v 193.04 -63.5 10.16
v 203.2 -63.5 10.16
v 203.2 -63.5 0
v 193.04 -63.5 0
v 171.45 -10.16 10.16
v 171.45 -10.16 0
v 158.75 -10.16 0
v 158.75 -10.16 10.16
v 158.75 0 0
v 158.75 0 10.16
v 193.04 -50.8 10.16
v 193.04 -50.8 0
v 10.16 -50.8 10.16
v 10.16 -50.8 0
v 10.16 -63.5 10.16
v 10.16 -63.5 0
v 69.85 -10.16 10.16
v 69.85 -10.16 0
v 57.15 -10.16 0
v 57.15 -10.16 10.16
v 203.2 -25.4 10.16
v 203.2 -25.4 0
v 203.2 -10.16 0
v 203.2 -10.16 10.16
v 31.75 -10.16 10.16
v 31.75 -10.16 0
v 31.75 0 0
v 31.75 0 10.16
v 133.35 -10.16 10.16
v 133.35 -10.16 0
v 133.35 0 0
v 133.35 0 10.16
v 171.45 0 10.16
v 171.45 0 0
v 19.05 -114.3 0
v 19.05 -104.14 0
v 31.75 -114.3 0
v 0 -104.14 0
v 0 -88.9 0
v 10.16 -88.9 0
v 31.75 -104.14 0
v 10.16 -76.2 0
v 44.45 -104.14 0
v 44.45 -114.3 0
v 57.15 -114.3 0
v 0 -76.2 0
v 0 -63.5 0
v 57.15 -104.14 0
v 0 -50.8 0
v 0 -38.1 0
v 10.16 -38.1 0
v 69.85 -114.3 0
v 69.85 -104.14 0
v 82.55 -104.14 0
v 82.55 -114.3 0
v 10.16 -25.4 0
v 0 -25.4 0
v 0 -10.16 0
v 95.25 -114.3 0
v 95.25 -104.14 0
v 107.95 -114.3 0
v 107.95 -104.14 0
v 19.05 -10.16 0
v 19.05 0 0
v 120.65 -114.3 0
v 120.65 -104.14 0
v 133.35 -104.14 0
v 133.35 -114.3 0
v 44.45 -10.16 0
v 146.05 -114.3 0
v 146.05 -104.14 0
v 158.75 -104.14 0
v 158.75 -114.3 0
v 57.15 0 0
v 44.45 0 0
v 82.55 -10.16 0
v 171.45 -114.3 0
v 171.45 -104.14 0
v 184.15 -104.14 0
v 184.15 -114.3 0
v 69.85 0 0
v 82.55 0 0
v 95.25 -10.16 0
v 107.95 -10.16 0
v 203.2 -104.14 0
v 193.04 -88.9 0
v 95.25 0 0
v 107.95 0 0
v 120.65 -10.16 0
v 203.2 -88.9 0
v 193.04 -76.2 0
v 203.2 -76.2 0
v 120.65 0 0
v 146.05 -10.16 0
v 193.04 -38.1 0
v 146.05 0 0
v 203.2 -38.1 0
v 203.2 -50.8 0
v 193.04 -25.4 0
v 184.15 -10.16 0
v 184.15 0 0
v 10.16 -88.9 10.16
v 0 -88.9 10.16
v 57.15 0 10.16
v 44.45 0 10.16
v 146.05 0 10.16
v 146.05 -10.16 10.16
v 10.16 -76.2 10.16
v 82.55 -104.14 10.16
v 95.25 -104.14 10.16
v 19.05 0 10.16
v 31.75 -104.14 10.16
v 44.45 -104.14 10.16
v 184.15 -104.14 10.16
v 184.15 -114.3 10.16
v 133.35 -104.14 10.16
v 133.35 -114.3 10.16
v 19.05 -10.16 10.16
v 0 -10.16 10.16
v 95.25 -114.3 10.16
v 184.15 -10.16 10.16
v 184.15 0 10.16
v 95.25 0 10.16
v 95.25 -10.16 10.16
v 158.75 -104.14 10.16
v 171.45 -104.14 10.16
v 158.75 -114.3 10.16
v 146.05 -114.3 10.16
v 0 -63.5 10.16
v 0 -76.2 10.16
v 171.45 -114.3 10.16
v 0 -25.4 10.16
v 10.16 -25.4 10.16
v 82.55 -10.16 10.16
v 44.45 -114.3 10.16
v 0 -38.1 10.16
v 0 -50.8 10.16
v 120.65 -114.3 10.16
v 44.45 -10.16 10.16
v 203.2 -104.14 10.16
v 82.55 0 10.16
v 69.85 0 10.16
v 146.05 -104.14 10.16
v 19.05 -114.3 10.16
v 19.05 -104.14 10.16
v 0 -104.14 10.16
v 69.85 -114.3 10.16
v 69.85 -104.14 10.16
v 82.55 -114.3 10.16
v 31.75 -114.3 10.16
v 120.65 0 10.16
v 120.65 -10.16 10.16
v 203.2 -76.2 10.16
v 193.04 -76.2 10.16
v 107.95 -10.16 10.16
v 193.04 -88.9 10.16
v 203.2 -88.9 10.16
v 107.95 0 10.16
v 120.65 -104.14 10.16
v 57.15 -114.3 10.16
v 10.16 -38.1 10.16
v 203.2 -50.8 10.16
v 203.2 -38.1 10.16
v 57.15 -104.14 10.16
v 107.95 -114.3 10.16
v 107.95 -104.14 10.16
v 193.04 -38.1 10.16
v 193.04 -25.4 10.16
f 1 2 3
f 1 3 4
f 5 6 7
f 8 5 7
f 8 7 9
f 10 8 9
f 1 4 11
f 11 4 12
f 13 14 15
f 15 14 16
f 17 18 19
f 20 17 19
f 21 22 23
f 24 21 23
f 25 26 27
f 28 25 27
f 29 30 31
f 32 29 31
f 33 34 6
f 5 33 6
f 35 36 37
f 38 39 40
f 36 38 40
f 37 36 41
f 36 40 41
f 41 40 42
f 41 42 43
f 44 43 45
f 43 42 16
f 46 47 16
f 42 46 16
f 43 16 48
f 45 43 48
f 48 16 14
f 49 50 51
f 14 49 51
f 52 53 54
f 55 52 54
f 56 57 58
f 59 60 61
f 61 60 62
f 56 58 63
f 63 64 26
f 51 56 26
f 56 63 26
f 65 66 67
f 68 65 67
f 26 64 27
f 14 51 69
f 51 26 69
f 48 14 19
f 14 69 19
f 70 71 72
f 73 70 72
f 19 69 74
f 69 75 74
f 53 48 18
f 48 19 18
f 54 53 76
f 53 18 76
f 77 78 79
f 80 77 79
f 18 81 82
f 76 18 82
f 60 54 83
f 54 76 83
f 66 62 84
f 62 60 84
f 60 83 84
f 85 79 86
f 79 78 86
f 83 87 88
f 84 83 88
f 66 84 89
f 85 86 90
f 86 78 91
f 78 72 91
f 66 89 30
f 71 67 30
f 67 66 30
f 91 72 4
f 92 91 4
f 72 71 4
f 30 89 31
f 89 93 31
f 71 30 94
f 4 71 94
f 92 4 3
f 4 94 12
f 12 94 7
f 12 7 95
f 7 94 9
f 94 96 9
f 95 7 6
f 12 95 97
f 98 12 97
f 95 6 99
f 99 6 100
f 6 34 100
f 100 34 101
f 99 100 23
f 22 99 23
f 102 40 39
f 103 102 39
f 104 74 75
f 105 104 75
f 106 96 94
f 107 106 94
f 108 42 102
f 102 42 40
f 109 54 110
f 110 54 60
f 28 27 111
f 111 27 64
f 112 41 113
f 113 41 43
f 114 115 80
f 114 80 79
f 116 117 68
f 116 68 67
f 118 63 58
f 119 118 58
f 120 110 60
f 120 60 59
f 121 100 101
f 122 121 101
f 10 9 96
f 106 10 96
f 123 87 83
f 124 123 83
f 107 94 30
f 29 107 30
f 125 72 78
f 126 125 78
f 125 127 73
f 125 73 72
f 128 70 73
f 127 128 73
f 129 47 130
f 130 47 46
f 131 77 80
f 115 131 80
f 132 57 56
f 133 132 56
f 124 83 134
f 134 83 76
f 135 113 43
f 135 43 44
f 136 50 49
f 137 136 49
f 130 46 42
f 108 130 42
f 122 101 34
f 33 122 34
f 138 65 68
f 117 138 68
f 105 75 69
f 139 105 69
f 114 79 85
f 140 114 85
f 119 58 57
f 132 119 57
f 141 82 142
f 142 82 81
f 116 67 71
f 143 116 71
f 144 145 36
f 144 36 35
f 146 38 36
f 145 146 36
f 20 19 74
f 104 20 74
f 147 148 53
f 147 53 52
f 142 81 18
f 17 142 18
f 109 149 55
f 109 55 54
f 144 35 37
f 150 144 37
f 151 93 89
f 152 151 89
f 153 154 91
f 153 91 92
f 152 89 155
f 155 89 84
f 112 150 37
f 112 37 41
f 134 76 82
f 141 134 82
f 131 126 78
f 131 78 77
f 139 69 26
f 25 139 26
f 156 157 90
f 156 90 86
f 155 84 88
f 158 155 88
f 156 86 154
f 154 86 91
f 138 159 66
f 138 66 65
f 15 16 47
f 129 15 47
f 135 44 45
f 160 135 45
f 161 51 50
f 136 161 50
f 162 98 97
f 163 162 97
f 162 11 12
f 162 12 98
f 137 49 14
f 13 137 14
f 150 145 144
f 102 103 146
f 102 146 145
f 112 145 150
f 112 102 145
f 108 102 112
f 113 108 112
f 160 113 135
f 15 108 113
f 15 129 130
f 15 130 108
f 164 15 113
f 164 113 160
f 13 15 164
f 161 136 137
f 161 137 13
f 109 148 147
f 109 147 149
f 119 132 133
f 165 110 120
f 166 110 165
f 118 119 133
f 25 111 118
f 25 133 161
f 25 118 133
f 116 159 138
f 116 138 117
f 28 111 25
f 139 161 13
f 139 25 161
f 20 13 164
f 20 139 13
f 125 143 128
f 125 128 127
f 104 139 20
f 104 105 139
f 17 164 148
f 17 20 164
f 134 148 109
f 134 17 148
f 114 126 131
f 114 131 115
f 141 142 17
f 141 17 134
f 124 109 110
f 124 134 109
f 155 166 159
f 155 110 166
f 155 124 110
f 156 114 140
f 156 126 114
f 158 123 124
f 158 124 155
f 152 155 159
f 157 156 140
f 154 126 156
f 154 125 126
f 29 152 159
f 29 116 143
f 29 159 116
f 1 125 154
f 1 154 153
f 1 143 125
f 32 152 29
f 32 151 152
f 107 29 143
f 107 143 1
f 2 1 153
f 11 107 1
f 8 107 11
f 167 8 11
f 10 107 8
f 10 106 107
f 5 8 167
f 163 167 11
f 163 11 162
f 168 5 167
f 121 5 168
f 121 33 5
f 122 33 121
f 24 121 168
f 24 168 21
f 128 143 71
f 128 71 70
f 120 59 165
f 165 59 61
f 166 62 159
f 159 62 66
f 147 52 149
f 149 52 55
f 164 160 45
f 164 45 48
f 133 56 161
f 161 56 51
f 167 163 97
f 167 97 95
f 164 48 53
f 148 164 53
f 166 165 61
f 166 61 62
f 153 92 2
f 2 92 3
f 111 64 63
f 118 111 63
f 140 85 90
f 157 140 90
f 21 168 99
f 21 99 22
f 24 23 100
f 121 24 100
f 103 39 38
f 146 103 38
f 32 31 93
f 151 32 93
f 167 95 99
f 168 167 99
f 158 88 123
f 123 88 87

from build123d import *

# Parameters (mm, degrees)
F1_DEPTH = 10.16


with BuildPart() as f1:
    # F0 (on Top) → F1 (new body)
    with BuildSketch(Plane.XY):
        Polygon((31.75, 0), (19.05, 0), (19.05, -10.16), (0, -10.16), (0, -25.4), (10.16, -25.4), (10.16, -38.1), (0, -38.1), (0, -50.8), (10.16, -50.8), (10.16, -63.5), (0, -63.5), (0, -76.2), (10.16, -76.2), (10.16, -88.9), (0, -88.9), (0, -104.14), (19.05, -104.14), (19.05, -114.3), (31.75, -114.3), (31.75, -104.14), (44.45, -104.14), (44.45, -114.3), (57.15, -114.3), (57.15, -104.14), (69.85, -104.14), (69.85, -114.3), (82.55, -114.3), (82.55, -104.14), (95.25, -104.14), (95.25, -114.3), (107.95, -114.3), (107.95, -104.14), (120.65, -104.14), (120.65, -114.3), (133.35, -114.3), (133.35, -104.14), (146.05, -104.14), (146.05, -114.3), (158.75, -114.3), (158.75, -104.14), (171.45, -104.14), (171.45, -114.3), (184.15, -114.3), (184.15, -104.14), (203.2, -104.14), (203.2, -88.9), (193.04, -88.9), (193.04, -76.2), (203.2, -76.2), (203.2, -63.5), (193.04, -63.5), (193.04, -50.8), (203.2, -50.8), (203.2, -38.1), (193.04, -38.1), (193.04, -25.4), (203.2, -25.4), (203.2, -10.16), (184.15, -10.16), (184.15, 0), (171.45, 0), (171.45, -10.16), (158.75, -10.16), (158.75, 0), (146.05, 0), (146.05, -10.16), (133.35, -10.16), (133.35, 0), (120.65, 0), (120.65, -10.16), (107.95, -10.16), (107.95, 0), (95.25, 0), (95.25, -10.16), (82.55, -10.16), (82.55, 0), (69.85, 0), (69.85, -10.16), (57.15, -10.16), (57.15, 0), (44.45, 0), (44.45, -10.16), (31.75, -10.16), align=None)
    extrude(amount=F1_DEPTH)


solid = f1.part
